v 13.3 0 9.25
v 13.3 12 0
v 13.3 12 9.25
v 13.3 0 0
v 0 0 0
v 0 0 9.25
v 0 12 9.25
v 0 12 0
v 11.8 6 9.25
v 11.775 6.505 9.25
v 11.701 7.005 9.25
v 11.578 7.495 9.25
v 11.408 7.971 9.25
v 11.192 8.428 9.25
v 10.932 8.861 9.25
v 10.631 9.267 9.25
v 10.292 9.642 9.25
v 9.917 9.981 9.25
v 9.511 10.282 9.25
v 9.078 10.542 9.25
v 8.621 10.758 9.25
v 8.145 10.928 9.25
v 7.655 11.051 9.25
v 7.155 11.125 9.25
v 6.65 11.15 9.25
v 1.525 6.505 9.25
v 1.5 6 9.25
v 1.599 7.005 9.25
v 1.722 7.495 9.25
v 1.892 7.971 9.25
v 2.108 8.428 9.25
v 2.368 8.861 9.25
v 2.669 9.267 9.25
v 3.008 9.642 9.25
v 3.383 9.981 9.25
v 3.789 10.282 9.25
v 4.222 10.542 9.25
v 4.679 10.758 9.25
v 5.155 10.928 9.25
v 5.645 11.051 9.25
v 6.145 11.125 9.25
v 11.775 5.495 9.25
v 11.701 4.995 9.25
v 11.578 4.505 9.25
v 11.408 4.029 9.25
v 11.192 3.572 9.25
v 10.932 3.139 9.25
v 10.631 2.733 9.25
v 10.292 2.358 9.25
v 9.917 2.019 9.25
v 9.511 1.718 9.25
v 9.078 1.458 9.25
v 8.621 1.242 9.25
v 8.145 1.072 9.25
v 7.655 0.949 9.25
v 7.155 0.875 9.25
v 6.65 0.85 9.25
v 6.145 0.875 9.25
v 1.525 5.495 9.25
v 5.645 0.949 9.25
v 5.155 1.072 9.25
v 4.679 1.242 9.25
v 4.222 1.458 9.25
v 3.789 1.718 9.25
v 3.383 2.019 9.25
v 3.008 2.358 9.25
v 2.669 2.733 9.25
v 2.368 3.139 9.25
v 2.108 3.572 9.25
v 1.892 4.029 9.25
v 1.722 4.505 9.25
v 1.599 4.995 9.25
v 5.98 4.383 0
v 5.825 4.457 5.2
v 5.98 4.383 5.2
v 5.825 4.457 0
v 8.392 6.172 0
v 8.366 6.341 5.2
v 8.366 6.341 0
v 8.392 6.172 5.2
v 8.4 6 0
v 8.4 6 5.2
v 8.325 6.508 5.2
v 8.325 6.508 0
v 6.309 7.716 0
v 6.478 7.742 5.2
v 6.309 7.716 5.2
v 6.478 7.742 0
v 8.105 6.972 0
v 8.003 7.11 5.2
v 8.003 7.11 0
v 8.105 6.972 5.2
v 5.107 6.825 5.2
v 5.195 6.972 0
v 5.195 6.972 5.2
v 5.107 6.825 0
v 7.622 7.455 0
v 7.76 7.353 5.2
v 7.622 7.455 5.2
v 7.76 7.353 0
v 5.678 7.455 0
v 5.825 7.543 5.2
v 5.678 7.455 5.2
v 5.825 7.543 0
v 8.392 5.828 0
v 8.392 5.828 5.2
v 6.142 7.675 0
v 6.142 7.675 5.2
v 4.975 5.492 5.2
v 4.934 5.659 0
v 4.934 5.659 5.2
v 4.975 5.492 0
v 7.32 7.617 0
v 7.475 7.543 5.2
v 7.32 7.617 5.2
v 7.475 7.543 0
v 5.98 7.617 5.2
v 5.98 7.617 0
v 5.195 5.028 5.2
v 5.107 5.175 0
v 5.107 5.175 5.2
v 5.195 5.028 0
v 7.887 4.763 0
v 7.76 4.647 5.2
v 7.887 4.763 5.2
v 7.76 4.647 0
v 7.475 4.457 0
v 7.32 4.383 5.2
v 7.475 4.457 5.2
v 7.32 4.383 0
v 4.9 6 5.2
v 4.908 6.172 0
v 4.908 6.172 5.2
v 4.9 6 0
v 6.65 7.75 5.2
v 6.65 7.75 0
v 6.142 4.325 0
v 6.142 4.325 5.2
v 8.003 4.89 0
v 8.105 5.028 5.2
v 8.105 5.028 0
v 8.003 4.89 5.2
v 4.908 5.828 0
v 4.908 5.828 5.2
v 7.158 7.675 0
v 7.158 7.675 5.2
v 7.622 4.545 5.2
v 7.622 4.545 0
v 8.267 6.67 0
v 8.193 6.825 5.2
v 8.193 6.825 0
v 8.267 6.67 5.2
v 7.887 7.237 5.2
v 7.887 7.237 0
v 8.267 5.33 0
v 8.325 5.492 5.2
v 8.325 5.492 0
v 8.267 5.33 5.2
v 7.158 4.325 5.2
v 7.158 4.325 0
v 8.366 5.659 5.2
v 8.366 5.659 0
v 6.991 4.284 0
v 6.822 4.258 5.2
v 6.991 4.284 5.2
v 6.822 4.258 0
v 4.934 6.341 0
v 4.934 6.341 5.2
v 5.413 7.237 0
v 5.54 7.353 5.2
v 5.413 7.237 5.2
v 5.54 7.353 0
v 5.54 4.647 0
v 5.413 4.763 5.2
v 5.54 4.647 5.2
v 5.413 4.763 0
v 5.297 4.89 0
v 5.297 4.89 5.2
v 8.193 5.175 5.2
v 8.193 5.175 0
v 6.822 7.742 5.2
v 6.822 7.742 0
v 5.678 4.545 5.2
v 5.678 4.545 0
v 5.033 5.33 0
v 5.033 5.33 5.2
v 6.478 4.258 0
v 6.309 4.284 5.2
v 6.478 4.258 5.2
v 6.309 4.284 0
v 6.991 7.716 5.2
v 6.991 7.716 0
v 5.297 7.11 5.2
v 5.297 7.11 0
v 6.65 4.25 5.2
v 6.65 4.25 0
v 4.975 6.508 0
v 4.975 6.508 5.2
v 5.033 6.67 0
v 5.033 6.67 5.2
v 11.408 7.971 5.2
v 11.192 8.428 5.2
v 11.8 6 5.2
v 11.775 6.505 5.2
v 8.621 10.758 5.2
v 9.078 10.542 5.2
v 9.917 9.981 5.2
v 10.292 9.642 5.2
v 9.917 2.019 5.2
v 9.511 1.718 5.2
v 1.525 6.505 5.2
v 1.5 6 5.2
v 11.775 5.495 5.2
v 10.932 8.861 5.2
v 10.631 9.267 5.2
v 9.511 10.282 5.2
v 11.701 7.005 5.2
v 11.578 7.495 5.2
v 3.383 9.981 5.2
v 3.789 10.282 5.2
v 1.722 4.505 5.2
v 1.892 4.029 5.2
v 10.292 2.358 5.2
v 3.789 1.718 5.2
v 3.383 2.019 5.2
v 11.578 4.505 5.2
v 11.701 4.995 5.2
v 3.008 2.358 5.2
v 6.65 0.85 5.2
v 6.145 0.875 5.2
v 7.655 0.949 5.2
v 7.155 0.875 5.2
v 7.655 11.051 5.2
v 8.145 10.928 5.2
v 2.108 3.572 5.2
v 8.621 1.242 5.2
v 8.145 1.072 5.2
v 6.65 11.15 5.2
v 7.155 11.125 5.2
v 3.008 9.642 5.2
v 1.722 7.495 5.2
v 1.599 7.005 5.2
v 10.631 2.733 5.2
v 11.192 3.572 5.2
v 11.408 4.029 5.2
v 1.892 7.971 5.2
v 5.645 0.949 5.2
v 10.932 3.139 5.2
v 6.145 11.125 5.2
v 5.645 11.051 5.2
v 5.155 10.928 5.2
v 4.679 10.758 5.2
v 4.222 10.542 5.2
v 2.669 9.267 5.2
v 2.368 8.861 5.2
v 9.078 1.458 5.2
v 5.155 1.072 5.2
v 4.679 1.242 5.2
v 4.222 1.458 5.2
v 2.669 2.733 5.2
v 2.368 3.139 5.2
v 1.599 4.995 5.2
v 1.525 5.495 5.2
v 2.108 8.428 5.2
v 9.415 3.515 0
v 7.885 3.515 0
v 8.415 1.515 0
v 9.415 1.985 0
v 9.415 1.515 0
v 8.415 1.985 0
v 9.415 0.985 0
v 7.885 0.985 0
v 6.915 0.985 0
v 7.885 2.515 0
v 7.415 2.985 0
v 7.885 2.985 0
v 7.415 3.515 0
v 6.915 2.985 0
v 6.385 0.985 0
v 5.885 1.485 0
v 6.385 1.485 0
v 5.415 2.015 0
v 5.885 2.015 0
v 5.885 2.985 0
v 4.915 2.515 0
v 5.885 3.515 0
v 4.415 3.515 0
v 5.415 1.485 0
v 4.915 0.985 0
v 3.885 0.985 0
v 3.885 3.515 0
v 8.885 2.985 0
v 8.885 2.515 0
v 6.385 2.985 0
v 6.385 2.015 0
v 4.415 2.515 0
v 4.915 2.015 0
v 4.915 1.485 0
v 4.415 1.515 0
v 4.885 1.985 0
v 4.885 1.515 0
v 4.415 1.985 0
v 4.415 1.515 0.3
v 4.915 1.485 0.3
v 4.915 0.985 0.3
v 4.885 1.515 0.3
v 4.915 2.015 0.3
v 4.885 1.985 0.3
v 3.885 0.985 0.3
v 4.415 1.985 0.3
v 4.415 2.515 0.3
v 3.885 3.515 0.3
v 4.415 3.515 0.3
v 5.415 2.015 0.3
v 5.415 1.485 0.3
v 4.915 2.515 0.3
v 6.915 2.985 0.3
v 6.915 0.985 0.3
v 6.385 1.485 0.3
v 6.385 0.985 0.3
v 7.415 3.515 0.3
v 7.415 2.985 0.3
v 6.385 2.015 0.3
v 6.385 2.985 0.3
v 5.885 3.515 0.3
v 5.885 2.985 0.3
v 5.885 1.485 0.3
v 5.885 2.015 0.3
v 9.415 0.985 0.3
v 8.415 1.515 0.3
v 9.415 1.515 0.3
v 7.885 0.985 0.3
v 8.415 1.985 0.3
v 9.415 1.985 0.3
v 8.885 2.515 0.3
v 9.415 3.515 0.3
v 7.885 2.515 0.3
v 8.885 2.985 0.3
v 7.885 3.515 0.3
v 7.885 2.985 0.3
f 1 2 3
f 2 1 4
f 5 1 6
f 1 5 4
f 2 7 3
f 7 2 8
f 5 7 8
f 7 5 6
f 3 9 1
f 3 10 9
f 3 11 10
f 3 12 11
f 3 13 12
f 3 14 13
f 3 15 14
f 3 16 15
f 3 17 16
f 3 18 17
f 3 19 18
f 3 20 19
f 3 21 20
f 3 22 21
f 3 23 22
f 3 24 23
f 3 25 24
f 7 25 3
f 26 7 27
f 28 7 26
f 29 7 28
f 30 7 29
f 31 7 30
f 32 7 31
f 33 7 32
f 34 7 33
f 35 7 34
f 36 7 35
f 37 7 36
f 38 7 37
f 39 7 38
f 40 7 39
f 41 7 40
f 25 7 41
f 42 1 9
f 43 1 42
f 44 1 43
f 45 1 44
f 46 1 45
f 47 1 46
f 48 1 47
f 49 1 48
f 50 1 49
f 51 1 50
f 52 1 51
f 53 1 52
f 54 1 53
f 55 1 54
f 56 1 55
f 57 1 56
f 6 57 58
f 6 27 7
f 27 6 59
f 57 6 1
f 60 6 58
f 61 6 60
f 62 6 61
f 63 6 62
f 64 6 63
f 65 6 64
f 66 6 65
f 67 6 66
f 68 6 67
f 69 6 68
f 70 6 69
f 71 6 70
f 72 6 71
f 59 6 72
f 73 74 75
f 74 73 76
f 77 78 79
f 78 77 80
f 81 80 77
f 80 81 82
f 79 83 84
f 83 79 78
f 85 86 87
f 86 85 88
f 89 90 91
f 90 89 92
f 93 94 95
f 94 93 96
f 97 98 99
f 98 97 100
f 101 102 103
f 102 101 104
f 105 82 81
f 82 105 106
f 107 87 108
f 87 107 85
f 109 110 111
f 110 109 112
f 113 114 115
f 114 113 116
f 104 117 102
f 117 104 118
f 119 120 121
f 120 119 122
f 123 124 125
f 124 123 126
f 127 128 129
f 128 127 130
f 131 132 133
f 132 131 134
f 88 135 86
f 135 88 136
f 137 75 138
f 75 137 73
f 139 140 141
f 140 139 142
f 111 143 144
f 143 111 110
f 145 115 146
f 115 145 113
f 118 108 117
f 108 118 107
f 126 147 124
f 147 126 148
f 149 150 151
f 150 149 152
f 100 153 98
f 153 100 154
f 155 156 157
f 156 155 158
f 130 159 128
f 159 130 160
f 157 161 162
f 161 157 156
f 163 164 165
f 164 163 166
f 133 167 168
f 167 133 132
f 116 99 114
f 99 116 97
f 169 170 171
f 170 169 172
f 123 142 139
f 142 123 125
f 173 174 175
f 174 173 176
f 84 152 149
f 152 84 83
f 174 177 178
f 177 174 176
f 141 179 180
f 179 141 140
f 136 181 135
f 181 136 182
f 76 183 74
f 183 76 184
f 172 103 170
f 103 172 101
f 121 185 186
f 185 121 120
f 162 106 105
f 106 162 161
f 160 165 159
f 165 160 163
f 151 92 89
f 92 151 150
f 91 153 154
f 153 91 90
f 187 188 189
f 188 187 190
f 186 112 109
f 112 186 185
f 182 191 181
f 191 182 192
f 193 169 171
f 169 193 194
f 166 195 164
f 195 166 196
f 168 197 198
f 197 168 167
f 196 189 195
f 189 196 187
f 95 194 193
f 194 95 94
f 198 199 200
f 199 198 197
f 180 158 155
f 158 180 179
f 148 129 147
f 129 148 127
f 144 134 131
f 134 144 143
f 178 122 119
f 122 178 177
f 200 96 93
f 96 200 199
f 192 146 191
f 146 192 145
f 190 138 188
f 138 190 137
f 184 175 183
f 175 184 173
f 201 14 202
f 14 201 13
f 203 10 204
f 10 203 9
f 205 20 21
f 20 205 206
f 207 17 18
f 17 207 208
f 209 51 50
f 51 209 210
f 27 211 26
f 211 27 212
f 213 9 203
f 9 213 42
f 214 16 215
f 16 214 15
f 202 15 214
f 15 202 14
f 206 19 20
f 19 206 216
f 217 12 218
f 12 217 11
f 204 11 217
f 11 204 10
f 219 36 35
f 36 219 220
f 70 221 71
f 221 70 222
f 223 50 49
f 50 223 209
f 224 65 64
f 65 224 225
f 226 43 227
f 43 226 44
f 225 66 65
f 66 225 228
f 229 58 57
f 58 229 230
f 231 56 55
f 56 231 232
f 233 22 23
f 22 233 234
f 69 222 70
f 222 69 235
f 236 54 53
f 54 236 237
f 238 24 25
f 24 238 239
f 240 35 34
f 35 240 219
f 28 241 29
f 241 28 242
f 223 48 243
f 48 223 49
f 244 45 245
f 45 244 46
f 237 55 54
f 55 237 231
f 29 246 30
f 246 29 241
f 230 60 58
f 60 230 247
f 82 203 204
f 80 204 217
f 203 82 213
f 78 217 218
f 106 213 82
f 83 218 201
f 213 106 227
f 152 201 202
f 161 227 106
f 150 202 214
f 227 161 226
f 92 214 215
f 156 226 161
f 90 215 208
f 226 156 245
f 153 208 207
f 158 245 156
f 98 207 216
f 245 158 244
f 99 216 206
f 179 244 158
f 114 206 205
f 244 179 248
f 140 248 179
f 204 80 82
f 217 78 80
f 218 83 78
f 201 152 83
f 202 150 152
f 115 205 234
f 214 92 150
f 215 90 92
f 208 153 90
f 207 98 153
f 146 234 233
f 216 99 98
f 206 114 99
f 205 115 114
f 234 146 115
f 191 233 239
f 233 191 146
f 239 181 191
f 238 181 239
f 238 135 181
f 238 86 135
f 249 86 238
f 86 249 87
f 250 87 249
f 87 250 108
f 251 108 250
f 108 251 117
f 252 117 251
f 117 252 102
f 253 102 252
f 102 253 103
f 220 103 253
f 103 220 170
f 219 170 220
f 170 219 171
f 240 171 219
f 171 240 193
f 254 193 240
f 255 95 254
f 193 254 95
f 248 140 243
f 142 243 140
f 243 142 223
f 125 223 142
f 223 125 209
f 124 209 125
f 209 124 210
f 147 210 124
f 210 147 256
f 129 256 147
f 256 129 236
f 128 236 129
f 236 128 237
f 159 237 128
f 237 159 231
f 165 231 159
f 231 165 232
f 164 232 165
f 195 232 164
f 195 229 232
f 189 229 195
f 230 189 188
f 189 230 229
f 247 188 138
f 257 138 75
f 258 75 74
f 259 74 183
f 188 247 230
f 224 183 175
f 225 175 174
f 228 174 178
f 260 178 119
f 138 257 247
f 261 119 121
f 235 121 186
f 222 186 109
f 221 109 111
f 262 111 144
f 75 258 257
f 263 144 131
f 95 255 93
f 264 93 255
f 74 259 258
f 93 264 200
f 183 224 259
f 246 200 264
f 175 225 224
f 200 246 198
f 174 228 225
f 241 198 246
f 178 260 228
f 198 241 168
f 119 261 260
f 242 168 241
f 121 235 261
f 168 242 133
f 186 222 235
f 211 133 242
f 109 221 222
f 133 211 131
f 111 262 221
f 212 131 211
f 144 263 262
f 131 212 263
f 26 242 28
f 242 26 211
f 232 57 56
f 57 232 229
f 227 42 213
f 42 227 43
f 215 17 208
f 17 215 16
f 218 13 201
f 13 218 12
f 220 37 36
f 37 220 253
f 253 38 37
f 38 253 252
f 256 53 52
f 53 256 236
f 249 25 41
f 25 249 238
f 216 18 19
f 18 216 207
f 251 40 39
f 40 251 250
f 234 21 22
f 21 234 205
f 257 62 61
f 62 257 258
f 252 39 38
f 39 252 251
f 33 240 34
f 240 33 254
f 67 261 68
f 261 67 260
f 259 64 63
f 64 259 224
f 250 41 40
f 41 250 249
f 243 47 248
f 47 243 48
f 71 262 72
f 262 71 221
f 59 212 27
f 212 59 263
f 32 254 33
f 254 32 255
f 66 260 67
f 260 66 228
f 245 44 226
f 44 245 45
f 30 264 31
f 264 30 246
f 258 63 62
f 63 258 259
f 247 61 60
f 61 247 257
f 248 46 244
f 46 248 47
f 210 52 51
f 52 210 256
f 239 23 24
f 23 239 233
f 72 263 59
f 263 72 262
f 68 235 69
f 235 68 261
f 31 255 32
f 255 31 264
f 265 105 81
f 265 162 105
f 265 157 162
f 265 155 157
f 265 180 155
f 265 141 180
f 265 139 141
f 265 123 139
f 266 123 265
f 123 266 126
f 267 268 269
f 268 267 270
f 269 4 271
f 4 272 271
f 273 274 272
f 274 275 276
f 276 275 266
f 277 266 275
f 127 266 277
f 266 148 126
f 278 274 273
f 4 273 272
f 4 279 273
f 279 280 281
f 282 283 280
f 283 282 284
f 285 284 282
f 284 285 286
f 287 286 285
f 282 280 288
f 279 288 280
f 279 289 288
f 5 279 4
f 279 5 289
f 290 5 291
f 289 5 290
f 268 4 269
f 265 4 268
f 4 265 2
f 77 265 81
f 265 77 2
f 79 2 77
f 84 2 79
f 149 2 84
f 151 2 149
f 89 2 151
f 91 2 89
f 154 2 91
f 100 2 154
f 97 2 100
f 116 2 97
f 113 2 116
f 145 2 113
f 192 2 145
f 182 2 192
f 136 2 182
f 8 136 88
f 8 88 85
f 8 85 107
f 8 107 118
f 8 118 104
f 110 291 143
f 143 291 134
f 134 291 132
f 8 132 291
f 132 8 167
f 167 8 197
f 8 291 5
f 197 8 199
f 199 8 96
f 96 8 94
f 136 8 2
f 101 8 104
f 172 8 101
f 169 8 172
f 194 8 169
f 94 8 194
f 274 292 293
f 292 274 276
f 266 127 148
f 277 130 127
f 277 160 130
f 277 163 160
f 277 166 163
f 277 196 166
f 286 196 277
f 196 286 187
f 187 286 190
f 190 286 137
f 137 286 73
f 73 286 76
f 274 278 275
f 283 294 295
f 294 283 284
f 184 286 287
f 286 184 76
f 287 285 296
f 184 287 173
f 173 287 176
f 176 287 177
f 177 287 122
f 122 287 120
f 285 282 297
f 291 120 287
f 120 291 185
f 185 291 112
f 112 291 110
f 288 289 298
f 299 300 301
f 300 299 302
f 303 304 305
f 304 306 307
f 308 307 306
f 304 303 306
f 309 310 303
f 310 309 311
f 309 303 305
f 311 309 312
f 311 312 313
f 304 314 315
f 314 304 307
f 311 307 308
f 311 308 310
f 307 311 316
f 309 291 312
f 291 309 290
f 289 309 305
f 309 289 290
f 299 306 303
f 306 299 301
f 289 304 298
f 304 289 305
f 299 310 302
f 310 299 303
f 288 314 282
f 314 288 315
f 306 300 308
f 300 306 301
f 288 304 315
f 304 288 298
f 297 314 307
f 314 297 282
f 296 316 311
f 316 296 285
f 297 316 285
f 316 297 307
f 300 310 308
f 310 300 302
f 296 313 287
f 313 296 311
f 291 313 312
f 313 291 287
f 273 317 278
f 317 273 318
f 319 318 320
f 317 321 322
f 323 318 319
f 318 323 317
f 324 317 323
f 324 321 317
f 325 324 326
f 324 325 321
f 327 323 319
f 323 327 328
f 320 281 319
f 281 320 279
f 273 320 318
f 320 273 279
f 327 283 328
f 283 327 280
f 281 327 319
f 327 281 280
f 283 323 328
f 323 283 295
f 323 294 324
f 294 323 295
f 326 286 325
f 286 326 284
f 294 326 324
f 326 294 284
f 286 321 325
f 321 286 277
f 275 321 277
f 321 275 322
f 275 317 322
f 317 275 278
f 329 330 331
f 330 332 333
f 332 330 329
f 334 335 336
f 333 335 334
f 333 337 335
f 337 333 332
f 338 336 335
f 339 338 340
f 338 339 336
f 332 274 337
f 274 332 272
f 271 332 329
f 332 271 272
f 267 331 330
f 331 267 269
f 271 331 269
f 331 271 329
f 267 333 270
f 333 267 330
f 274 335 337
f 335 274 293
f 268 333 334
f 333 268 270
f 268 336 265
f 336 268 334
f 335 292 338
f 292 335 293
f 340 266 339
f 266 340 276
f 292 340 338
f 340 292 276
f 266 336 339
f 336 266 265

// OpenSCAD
// 上滾輪調整滑塊
$fn=64;
translate([-54.35,80.75,41]){rotate([90,0,0]){difference(){difference(){union(){difference(){difference(){translate([54.35,-38.25,68.75]){cube([13.3,6.5,12]);}translate([61,-40,74.75]){rotate([-90,0,0]){translate([0,0,0]){cylinder(h=10,d1=3.5,d2=3.5,$fn=64);}}}}translate([61,-35.8,74.75]){rotate([-90,0,0]){translate([0,0,0]){cylinder(h=4.3,d1=10.3,d2=10.3,$fn=64);}}}}translate([54.35,-41,68.75]){cube([13.3,2.8,12]);}}translate([61,-42,74.75]){rotate([-90,0,0]){translate([0,0,0]){cylinder(h=14,d1=3.5,d2=3.5,$fn=64);}}}}translate([0,-2.75,0]){difference(){difference(){difference(){translate([54.35,-38.25,68.75]){cube([13.3,6.5,12]);}translate([61,-40,74.75]){rotate([-90,0,0]){translate([0,0,0]){cylinder(h=10,d1=3.5,d2=3.5,$fn=64);}}}}translate([61,-35.8,74.75]){rotate([-90,0,0]){translate([0,0,0]){cylinder(h=4.3,d1=10.3,d2=10.3,$fn=64);}}}}difference(){difference(){difference(){translate([54.35,-38.25,68.75]){cube([13.3,6.5,12]);}translate([61,-40,74.75]){rotate([-90,0,0]){translate([0,0,0]){cylinder(h=10,d1=3.5,d2=3.5,$fn=64);}}}}translate([61,-35.8,74.75]){rotate([-90,0,0]){translate([0,0,0]){cylinder(h=4.3,d1=10.3,d2=10.3,$fn=64);}}}}multmatrix([[1,0,0,61],[0,0,-1,-38.25],[0,1,0,78.5],[0,0,0,1]]){union(){union(){union(){union(){union(){union(){union(){union(){union(){union(){union(){union(){union(){union(){union(){union(){union(){union(){union(){union(){union(){union(){union(){union(){union(){union(){translate([-2.765,0.735,-0.3]){cube([0.53,0.53,0.42]);}translate([-2.265,0.735,-0.3]){cube([0.53,0.53,0.42]);}}translate([-2.765,0.235,-0.3]){cube([0.53,0.53,0.42]);}}translate([-1.765,0.235,-0.3]){cube([0.53,0.53,0.42]);}}translate([-2.765,-0.265,-0.3]){cube([0.53,0.53,0.42]);}}translate([-2.265,-0.265,-0.3]){cube([0.53,0.53,0.42]);}}translate([-2.765,-0.765,-0.3]){cube([0.53,0.53,0.42]);}}translate([-2.765,-1.265,-0.3]){cube([0.53,0.53,0.42]);}}translate([-0.265,0.735,-0.3]){cube([0.53,0.53,0.42]);}}translate([-0.765,0.235,-0.3]){cube([0.53,0.53,0.42]);}}translate([-0.265,0.235,-0.3]){cube([0.53,0.53,0.42]);}}translate([-0.265,-0.265,-0.3]){cube([0.53,0.53,0.42]);}}translate([-0.265,-0.765,-0.3]){cube([0.53,0.53,0.42]);}}translate([-0.765,-1.265,-0.3]){cube([0.53,0.53,0.42]);}}translate([-0.265,-1.265,-0.3]){cube([0.53,0.53,0.42]);}}translate([0.235,-1.265,-0.3]){cube([0.53,0.53,0.42]);}}translate([1.235,0.735,-0.3]){cube([0.53,0.53,0.42]);}}translate([1.735,0.735,-0.3]){cube([0.53,0.53,0.42]);}}translate([2.235,0.735,-0.3]){cube([0.53,0.53,0.42]);}}translate([1.235,0.235,-0.3]){cube([0.53,0.53,0.42]);}}translate([1.235,-0.265,-0.3]){cube([0.53,0.53,0.42]);}}translate([1.735,-0.265,-0.3]){cube([0.53,0.53,0.42]);}}translate([2.235,-0.265,-0.3]){cube([0.53,0.53,0.42]);}}translate([2.235,-0.765,-0.3]){cube([0.53,0.53,0.42]);}}translate([1.235,-1.265,-0.3]){cube([0.53,0.53,0.42]);}}translate([1.735,-1.265,-0.3]){cube([0.53,0.53,0.42]);}}translate([2.235,-1.265,-0.3]){cube([0.53,0.53,0.42]);}}}}}}}}}
